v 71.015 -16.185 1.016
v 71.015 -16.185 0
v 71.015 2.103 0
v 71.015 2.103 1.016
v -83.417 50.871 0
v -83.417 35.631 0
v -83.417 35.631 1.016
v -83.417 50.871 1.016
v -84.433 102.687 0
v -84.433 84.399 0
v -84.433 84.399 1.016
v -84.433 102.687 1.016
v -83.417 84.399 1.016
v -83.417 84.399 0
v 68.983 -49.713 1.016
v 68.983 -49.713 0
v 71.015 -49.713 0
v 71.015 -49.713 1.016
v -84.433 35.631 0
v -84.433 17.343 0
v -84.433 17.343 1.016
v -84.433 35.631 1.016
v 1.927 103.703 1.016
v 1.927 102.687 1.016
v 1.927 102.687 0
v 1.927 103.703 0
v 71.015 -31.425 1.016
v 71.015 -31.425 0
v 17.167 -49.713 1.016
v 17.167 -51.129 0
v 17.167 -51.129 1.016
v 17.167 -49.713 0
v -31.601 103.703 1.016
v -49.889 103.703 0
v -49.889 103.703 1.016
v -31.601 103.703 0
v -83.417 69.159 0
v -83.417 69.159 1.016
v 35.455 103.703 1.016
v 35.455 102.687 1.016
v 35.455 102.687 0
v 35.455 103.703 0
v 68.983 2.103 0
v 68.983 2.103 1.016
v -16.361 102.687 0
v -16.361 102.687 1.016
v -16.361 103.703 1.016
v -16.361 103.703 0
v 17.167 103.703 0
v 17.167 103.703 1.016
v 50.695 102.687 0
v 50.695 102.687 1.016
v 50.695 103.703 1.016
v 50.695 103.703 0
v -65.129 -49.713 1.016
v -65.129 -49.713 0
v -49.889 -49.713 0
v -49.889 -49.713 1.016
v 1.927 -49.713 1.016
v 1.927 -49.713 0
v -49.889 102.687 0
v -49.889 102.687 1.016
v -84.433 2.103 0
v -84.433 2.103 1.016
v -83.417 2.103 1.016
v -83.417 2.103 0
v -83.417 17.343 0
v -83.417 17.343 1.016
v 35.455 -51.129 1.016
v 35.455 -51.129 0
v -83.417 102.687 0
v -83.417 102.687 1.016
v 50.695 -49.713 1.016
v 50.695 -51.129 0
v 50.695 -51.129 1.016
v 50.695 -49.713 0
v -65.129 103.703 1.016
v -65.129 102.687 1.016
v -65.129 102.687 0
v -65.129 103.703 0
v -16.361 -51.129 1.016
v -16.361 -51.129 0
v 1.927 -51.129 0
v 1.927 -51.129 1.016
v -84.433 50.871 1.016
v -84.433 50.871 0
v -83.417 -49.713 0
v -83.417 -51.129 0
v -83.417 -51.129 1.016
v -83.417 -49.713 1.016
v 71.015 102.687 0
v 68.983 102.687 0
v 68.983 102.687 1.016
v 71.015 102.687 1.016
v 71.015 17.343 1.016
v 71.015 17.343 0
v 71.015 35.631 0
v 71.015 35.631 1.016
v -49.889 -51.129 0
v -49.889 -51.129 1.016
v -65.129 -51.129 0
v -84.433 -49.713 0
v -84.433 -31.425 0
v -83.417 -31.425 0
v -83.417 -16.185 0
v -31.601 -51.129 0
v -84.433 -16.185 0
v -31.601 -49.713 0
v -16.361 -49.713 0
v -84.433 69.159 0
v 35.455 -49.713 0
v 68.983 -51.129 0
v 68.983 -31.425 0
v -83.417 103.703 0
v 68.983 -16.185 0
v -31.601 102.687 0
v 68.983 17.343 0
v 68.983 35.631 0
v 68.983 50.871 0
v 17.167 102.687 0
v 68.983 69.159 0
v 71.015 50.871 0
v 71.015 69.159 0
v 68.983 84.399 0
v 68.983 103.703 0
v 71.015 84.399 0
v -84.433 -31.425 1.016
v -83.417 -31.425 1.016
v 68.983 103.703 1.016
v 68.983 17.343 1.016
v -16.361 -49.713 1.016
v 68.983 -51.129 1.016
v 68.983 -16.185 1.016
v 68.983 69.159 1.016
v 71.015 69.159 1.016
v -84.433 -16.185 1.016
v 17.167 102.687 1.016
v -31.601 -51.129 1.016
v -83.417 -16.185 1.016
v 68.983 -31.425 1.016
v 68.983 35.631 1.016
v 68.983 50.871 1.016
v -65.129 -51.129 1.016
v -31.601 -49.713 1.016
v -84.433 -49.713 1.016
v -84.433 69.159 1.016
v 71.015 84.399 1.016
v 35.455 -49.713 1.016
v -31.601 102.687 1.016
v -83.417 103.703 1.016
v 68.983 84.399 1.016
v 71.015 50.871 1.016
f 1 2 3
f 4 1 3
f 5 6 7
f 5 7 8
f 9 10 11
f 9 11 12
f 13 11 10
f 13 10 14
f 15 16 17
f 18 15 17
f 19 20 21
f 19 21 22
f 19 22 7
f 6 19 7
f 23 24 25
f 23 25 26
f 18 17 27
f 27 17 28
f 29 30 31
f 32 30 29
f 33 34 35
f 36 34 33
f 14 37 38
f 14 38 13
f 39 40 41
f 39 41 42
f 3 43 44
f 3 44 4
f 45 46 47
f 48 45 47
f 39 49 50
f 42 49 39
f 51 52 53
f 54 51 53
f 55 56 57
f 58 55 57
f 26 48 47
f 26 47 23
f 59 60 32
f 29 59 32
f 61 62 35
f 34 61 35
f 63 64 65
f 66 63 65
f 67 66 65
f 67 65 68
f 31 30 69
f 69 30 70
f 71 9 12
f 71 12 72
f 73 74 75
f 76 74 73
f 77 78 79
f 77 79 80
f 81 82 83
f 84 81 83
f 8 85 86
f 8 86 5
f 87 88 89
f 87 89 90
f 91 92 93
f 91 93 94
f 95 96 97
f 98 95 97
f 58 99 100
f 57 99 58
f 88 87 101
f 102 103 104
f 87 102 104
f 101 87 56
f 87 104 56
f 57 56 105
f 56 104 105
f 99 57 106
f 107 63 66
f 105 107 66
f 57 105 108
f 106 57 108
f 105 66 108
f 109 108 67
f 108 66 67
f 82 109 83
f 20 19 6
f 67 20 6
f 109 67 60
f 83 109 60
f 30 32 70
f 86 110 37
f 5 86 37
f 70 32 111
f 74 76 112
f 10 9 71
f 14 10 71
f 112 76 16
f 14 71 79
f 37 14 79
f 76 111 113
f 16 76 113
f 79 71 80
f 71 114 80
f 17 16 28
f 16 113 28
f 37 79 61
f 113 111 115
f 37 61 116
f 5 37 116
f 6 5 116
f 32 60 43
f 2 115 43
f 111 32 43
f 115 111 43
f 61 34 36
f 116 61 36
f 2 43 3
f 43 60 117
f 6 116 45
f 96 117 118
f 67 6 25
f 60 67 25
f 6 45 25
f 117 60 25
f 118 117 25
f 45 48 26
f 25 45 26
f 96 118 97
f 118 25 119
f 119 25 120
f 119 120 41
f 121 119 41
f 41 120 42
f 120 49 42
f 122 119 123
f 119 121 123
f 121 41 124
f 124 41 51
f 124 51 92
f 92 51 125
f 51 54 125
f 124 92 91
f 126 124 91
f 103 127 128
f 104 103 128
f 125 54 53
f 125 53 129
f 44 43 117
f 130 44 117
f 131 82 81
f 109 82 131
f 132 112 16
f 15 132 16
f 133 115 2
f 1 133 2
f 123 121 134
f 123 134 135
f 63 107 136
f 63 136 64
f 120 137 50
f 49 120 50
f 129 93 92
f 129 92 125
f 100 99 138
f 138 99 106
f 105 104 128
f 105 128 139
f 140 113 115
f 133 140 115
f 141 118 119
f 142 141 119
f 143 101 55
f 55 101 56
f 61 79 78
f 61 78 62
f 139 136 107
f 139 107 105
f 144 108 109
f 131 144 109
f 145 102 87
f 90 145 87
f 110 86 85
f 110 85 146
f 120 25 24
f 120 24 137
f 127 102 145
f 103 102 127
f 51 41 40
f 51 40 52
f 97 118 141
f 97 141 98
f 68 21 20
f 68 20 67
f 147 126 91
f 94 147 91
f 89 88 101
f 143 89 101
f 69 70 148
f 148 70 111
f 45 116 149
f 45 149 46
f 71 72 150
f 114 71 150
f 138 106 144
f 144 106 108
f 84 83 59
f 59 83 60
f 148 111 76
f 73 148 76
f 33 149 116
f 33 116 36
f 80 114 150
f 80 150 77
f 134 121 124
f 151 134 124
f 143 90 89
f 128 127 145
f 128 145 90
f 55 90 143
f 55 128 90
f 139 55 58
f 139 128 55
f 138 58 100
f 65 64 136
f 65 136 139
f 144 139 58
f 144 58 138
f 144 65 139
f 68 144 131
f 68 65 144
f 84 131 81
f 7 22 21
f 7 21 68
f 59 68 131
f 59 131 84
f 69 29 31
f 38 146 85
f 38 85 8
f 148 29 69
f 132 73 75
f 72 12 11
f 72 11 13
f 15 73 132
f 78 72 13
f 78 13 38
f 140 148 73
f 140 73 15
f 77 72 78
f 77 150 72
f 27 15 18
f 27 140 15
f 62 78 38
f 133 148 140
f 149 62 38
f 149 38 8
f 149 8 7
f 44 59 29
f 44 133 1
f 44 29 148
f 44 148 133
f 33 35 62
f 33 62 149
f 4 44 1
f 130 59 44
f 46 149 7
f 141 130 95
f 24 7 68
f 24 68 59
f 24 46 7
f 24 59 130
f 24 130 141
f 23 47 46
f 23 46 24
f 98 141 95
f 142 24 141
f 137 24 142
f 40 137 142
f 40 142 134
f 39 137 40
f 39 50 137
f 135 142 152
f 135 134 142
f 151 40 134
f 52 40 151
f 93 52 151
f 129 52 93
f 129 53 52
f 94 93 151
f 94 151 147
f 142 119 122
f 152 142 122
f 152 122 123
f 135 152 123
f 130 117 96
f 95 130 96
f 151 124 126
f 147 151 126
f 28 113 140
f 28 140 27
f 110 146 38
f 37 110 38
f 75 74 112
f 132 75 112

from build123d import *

# Parameters (mm, degrees)
SKETCH1_W           = 152.4
SKETCH1_H           = 152.4
SKETCH1_W_2         = 127
SKETCH1_H_2         = 127
SKETCH1_W_3         = 18.288
SKETCH1_H_3         = 1.016
SKETCH1_W_4         = 2.032
SKETCH1_H_4         = 18.288
SKETCH1_W_5         = 1.016
SKETCH1_H_5         = 1.415312077
BOSS_EXTRUDE1_DEPTH = 1.016


with BuildPart() as part:
    # Sketch1 → Boss-Extrude1 (new body)
    # profile 1 of 22: a face of its own
    with BuildSketch(Plane.XY):
        with Locations((-7.216666869, 26.486776145)):
            Rectangle(SKETCH1_W, SKETCH1_H)
        with Locations((-7.216666869, 26.486776145)):
            Rectangle(SKETCH1_W_2, SKETCH1_H_2, mode=Mode.SUBTRACT)
    # profile 2 of 22: a face of its own
    with BuildSketch(Plane.XY):
        with Locations((59.839333131, 103.194776145)):
            Rectangle(SKETCH1_W_3, SKETCH1_H_3)
    # profile 3 of 22: a face of its own
    with BuildSketch(Plane.XY):
        with Locations((69.999333131, 93.542776145)):
            Rectangle(SKETCH1_W_4, SKETCH1_H_4)
    # profile 4 of 22: a face of its own
    with BuildSketch(Plane.XY):
        with Locations((26.311333131, 103.194776145)):
            Rectangle(SKETCH1_W_3, SKETCH1_H_3)
    # profile 5 of 22: a face of its own
    with BuildSketch(Plane.XY):
        with Locations((-7.216666869, 103.194776145)):
            Rectangle(SKETCH1_W_3, SKETCH1_H_3)
    # profile 6 of 22: a face of its own
    with BuildSketch(Plane.XY):
        with Locations((-40.744666869, 103.194776145)):
            Rectangle(SKETCH1_W_3, SKETCH1_H_3)
    # profile 7 of 22: a face of its own
    with BuildSketch(Plane.XY):
        with Locations((-74.272666869, 103.194776145)):
            Rectangle(SKETCH1_W_3, SKETCH1_H_3)
    # profile 8 of 22: a face of its own
    with BuildSketch(Plane.XY):
        with Locations((-83.924666869, 93.542776145)):
            Rectangle(SKETCH1_W_5, SKETCH1_H_4)
    # profile 9 of 22: a face of its own
    with BuildSketch(Plane.XY):
        with Locations((-83.924666869, 60.014776145)):
            Rectangle(SKETCH1_W_5, SKETCH1_H_4)
    # profile 10 of 22: a face of its own
    with BuildSketch(Plane.XY):
        with Locations((-83.924666869, -40.569223855)):
            Rectangle(SKETCH1_W_5, SKETCH1_H_4)
    # profile 11 of 22: a face of its own
    with BuildSketch(Plane.XY):
        with Locations((-74.272666869, -50.420879894)):
            Rectangle(SKETCH1_W_3, SKETCH1_H_5)
    # profile 12 of 22: a face of its own
    with BuildSketch(Plane.XY):
        with Locations((-40.744666869, -50.420879894)):
            Rectangle(SKETCH1_W_3, SKETCH1_H_5)
    # profile 13 of 22: a face of its own
    with BuildSketch(Plane.XY):
        with Locations((26.311333131, -50.420879894)):
            Rectangle(SKETCH1_W_3, SKETCH1_H_5)
    # profile 14 of 22: a face of its own
    with BuildSketch(Plane.XY):
        with Locations((-7.216666869, -50.420879894)):
            Rectangle(SKETCH1_W_3, SKETCH1_H_5)
    # profile 15 of 22: a face of its own
    with BuildSketch(Plane.XY):
        with Locations((59.839333131, -50.420879894)):
            Rectangle(SKETCH1_W_3, SKETCH1_H_5)
    # profile 16 of 22: a face of its own
    with BuildSketch(Plane.XY):
        with Locations((69.999333131, -40.569223855)):
            Rectangle(SKETCH1_W_4, SKETCH1_H_4)
    # profile 17 of 22: a face of its own
    with BuildSketch(Plane.XY):
        with Locations((69.999333131, -7.041223855)):
            Rectangle(SKETCH1_W_4, SKETCH1_H_4)
    # profile 18 of 22: a face of its own
    with BuildSketch(Plane.XY):
        with Locations((69.999333131, 26.486776145)):
            Rectangle(SKETCH1_W_4, SKETCH1_H_4)
    # profile 19 of 22: a face of its own
    with BuildSketch(Plane.XY):
        with Locations((69.999333131, 60.014776145)):
            Rectangle(SKETCH1_W_4, SKETCH1_H_4)
    # profile 20 of 22: a face of its own
    with BuildSketch(Plane.XY):
        with Locations((-7.216666869, 26.486776145)):
            Rectangle(SKETCH1_W_2, SKETCH1_H_2)
    # profile 21 of 22: a face of its own
    with BuildSketch(Plane.XY):
        with Locations((-83.924666869, 26.486776145)):
            Rectangle(SKETCH1_W_5, SKETCH1_H_4)
    # profile 22 of 22: a face of its own
    with BuildSketch(Plane.XY):
        with Locations((-83.924666869, -7.041223855)):
            Rectangle(SKETCH1_W_5, SKETCH1_H_4)
    extrude(amount=BOSS_EXTRUDE1_DEPTH)


solid = part.part
